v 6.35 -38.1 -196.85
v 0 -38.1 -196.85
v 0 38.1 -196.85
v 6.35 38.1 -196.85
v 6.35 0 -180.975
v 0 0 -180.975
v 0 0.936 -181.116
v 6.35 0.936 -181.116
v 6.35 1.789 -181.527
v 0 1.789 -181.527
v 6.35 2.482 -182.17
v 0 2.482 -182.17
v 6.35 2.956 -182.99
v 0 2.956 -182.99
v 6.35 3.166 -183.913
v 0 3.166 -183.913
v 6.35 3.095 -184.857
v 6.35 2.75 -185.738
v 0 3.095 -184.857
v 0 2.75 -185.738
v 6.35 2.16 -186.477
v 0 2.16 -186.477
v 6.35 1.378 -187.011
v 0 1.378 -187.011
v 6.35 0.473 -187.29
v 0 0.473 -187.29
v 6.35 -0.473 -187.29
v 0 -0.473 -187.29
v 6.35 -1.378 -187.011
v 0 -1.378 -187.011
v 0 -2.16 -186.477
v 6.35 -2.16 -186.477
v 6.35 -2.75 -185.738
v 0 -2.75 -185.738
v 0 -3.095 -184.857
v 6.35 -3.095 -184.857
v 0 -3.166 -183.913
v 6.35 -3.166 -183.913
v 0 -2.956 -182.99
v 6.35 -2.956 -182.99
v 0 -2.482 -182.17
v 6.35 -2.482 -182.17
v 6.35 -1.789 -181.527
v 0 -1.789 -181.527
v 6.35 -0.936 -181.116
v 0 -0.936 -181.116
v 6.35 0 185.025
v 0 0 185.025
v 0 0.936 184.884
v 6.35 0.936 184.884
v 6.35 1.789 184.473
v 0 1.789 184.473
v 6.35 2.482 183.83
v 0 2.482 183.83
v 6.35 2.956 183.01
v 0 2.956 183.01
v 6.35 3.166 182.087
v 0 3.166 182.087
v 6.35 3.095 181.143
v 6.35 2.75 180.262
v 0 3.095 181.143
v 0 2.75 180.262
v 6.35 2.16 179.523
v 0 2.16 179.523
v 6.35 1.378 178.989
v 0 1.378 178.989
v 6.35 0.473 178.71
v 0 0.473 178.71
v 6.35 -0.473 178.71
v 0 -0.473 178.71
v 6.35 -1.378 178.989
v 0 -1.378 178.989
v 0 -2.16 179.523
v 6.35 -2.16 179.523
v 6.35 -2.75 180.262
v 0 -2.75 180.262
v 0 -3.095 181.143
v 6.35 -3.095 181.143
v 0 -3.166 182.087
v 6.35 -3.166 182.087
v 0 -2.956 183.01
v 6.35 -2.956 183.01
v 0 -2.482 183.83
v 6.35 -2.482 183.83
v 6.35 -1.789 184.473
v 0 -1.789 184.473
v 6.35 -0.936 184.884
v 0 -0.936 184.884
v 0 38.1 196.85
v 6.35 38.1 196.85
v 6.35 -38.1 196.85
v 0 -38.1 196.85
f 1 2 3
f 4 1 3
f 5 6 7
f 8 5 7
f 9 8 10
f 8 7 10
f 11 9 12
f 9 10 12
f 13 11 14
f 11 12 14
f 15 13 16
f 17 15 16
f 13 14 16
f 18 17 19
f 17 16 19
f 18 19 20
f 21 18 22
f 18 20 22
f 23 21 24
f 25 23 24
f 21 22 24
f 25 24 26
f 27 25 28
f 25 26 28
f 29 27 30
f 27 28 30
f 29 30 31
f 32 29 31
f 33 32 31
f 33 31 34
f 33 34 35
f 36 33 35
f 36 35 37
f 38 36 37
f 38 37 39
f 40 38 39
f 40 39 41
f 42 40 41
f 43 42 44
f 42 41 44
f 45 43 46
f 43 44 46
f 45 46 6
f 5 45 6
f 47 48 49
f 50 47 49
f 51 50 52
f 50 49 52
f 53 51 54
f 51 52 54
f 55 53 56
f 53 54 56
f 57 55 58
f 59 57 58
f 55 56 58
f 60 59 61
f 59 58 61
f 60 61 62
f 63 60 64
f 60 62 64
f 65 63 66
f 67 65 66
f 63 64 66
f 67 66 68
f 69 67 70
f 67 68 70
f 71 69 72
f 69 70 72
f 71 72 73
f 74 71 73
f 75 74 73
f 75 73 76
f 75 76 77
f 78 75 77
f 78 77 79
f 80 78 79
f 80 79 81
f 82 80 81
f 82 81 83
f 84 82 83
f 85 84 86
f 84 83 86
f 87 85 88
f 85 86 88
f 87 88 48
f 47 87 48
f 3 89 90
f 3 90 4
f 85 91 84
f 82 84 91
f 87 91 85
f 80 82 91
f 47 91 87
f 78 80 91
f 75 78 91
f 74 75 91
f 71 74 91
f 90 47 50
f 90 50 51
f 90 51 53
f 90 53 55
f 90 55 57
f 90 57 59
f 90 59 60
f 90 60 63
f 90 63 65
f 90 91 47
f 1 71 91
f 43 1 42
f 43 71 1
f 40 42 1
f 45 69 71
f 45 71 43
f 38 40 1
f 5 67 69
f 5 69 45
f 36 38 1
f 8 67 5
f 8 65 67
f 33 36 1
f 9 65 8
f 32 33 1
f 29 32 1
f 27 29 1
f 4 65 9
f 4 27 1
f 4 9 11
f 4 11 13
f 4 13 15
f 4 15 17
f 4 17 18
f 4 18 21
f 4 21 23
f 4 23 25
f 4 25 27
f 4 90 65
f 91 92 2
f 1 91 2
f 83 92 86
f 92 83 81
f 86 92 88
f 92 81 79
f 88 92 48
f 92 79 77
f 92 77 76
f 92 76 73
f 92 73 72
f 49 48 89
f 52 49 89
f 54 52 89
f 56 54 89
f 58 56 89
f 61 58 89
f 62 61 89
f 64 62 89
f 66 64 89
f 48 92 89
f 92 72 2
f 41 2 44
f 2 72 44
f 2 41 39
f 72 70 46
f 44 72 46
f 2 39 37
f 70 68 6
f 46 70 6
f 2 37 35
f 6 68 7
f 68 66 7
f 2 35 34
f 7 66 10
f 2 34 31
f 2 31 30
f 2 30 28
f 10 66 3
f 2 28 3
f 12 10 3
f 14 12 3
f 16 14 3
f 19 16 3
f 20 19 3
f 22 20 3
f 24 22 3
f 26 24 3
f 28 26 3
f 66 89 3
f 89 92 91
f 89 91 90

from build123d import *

# Parameters (mm, degrees)
SKETCH3_W           = 393.7
SKETCH3_H           = 76.2
BOSS_EXTRUDE1_DEPTH = 6.35
SKETCH4_R           = 3.175
CUT_EXTRUDE1_DEPTH  = 6.35
SKETCH6_R           = 3.175
CUT_EXTRUDE3_DEPTH  = 6.35


with BuildPart() as part:
    # Sketch3 → Boss-Extrude1 (new body)
    with BuildSketch(Plane(origin=(0, 0, 0), x_dir=(0, 0, -1), z_dir=(1, 0, 0))):
        Rectangle(SKETCH3_W, SKETCH3_H)
    extrude(amount=BOSS_EXTRUDE1_DEPTH)

    # Sketch4 → Cut-Extrude1 (cut)
    with BuildSketch(Plane.ZY):
        with Locations((181.85, 0)):
            Circle(SKETCH4_R)
    extrude(amount=-CUT_EXTRUDE1_DEPTH, mode=Mode.SUBTRACT)

    # Sketch6 → Cut-Extrude3 (cut)
    with BuildSketch(Plane.ZY):
        with Locations((-184.15, 0)):
            Circle(SKETCH6_R)
    extrude(amount=-CUT_EXTRUDE3_DEPTH, mode=Mode.SUBTRACT)


solid = part.part
